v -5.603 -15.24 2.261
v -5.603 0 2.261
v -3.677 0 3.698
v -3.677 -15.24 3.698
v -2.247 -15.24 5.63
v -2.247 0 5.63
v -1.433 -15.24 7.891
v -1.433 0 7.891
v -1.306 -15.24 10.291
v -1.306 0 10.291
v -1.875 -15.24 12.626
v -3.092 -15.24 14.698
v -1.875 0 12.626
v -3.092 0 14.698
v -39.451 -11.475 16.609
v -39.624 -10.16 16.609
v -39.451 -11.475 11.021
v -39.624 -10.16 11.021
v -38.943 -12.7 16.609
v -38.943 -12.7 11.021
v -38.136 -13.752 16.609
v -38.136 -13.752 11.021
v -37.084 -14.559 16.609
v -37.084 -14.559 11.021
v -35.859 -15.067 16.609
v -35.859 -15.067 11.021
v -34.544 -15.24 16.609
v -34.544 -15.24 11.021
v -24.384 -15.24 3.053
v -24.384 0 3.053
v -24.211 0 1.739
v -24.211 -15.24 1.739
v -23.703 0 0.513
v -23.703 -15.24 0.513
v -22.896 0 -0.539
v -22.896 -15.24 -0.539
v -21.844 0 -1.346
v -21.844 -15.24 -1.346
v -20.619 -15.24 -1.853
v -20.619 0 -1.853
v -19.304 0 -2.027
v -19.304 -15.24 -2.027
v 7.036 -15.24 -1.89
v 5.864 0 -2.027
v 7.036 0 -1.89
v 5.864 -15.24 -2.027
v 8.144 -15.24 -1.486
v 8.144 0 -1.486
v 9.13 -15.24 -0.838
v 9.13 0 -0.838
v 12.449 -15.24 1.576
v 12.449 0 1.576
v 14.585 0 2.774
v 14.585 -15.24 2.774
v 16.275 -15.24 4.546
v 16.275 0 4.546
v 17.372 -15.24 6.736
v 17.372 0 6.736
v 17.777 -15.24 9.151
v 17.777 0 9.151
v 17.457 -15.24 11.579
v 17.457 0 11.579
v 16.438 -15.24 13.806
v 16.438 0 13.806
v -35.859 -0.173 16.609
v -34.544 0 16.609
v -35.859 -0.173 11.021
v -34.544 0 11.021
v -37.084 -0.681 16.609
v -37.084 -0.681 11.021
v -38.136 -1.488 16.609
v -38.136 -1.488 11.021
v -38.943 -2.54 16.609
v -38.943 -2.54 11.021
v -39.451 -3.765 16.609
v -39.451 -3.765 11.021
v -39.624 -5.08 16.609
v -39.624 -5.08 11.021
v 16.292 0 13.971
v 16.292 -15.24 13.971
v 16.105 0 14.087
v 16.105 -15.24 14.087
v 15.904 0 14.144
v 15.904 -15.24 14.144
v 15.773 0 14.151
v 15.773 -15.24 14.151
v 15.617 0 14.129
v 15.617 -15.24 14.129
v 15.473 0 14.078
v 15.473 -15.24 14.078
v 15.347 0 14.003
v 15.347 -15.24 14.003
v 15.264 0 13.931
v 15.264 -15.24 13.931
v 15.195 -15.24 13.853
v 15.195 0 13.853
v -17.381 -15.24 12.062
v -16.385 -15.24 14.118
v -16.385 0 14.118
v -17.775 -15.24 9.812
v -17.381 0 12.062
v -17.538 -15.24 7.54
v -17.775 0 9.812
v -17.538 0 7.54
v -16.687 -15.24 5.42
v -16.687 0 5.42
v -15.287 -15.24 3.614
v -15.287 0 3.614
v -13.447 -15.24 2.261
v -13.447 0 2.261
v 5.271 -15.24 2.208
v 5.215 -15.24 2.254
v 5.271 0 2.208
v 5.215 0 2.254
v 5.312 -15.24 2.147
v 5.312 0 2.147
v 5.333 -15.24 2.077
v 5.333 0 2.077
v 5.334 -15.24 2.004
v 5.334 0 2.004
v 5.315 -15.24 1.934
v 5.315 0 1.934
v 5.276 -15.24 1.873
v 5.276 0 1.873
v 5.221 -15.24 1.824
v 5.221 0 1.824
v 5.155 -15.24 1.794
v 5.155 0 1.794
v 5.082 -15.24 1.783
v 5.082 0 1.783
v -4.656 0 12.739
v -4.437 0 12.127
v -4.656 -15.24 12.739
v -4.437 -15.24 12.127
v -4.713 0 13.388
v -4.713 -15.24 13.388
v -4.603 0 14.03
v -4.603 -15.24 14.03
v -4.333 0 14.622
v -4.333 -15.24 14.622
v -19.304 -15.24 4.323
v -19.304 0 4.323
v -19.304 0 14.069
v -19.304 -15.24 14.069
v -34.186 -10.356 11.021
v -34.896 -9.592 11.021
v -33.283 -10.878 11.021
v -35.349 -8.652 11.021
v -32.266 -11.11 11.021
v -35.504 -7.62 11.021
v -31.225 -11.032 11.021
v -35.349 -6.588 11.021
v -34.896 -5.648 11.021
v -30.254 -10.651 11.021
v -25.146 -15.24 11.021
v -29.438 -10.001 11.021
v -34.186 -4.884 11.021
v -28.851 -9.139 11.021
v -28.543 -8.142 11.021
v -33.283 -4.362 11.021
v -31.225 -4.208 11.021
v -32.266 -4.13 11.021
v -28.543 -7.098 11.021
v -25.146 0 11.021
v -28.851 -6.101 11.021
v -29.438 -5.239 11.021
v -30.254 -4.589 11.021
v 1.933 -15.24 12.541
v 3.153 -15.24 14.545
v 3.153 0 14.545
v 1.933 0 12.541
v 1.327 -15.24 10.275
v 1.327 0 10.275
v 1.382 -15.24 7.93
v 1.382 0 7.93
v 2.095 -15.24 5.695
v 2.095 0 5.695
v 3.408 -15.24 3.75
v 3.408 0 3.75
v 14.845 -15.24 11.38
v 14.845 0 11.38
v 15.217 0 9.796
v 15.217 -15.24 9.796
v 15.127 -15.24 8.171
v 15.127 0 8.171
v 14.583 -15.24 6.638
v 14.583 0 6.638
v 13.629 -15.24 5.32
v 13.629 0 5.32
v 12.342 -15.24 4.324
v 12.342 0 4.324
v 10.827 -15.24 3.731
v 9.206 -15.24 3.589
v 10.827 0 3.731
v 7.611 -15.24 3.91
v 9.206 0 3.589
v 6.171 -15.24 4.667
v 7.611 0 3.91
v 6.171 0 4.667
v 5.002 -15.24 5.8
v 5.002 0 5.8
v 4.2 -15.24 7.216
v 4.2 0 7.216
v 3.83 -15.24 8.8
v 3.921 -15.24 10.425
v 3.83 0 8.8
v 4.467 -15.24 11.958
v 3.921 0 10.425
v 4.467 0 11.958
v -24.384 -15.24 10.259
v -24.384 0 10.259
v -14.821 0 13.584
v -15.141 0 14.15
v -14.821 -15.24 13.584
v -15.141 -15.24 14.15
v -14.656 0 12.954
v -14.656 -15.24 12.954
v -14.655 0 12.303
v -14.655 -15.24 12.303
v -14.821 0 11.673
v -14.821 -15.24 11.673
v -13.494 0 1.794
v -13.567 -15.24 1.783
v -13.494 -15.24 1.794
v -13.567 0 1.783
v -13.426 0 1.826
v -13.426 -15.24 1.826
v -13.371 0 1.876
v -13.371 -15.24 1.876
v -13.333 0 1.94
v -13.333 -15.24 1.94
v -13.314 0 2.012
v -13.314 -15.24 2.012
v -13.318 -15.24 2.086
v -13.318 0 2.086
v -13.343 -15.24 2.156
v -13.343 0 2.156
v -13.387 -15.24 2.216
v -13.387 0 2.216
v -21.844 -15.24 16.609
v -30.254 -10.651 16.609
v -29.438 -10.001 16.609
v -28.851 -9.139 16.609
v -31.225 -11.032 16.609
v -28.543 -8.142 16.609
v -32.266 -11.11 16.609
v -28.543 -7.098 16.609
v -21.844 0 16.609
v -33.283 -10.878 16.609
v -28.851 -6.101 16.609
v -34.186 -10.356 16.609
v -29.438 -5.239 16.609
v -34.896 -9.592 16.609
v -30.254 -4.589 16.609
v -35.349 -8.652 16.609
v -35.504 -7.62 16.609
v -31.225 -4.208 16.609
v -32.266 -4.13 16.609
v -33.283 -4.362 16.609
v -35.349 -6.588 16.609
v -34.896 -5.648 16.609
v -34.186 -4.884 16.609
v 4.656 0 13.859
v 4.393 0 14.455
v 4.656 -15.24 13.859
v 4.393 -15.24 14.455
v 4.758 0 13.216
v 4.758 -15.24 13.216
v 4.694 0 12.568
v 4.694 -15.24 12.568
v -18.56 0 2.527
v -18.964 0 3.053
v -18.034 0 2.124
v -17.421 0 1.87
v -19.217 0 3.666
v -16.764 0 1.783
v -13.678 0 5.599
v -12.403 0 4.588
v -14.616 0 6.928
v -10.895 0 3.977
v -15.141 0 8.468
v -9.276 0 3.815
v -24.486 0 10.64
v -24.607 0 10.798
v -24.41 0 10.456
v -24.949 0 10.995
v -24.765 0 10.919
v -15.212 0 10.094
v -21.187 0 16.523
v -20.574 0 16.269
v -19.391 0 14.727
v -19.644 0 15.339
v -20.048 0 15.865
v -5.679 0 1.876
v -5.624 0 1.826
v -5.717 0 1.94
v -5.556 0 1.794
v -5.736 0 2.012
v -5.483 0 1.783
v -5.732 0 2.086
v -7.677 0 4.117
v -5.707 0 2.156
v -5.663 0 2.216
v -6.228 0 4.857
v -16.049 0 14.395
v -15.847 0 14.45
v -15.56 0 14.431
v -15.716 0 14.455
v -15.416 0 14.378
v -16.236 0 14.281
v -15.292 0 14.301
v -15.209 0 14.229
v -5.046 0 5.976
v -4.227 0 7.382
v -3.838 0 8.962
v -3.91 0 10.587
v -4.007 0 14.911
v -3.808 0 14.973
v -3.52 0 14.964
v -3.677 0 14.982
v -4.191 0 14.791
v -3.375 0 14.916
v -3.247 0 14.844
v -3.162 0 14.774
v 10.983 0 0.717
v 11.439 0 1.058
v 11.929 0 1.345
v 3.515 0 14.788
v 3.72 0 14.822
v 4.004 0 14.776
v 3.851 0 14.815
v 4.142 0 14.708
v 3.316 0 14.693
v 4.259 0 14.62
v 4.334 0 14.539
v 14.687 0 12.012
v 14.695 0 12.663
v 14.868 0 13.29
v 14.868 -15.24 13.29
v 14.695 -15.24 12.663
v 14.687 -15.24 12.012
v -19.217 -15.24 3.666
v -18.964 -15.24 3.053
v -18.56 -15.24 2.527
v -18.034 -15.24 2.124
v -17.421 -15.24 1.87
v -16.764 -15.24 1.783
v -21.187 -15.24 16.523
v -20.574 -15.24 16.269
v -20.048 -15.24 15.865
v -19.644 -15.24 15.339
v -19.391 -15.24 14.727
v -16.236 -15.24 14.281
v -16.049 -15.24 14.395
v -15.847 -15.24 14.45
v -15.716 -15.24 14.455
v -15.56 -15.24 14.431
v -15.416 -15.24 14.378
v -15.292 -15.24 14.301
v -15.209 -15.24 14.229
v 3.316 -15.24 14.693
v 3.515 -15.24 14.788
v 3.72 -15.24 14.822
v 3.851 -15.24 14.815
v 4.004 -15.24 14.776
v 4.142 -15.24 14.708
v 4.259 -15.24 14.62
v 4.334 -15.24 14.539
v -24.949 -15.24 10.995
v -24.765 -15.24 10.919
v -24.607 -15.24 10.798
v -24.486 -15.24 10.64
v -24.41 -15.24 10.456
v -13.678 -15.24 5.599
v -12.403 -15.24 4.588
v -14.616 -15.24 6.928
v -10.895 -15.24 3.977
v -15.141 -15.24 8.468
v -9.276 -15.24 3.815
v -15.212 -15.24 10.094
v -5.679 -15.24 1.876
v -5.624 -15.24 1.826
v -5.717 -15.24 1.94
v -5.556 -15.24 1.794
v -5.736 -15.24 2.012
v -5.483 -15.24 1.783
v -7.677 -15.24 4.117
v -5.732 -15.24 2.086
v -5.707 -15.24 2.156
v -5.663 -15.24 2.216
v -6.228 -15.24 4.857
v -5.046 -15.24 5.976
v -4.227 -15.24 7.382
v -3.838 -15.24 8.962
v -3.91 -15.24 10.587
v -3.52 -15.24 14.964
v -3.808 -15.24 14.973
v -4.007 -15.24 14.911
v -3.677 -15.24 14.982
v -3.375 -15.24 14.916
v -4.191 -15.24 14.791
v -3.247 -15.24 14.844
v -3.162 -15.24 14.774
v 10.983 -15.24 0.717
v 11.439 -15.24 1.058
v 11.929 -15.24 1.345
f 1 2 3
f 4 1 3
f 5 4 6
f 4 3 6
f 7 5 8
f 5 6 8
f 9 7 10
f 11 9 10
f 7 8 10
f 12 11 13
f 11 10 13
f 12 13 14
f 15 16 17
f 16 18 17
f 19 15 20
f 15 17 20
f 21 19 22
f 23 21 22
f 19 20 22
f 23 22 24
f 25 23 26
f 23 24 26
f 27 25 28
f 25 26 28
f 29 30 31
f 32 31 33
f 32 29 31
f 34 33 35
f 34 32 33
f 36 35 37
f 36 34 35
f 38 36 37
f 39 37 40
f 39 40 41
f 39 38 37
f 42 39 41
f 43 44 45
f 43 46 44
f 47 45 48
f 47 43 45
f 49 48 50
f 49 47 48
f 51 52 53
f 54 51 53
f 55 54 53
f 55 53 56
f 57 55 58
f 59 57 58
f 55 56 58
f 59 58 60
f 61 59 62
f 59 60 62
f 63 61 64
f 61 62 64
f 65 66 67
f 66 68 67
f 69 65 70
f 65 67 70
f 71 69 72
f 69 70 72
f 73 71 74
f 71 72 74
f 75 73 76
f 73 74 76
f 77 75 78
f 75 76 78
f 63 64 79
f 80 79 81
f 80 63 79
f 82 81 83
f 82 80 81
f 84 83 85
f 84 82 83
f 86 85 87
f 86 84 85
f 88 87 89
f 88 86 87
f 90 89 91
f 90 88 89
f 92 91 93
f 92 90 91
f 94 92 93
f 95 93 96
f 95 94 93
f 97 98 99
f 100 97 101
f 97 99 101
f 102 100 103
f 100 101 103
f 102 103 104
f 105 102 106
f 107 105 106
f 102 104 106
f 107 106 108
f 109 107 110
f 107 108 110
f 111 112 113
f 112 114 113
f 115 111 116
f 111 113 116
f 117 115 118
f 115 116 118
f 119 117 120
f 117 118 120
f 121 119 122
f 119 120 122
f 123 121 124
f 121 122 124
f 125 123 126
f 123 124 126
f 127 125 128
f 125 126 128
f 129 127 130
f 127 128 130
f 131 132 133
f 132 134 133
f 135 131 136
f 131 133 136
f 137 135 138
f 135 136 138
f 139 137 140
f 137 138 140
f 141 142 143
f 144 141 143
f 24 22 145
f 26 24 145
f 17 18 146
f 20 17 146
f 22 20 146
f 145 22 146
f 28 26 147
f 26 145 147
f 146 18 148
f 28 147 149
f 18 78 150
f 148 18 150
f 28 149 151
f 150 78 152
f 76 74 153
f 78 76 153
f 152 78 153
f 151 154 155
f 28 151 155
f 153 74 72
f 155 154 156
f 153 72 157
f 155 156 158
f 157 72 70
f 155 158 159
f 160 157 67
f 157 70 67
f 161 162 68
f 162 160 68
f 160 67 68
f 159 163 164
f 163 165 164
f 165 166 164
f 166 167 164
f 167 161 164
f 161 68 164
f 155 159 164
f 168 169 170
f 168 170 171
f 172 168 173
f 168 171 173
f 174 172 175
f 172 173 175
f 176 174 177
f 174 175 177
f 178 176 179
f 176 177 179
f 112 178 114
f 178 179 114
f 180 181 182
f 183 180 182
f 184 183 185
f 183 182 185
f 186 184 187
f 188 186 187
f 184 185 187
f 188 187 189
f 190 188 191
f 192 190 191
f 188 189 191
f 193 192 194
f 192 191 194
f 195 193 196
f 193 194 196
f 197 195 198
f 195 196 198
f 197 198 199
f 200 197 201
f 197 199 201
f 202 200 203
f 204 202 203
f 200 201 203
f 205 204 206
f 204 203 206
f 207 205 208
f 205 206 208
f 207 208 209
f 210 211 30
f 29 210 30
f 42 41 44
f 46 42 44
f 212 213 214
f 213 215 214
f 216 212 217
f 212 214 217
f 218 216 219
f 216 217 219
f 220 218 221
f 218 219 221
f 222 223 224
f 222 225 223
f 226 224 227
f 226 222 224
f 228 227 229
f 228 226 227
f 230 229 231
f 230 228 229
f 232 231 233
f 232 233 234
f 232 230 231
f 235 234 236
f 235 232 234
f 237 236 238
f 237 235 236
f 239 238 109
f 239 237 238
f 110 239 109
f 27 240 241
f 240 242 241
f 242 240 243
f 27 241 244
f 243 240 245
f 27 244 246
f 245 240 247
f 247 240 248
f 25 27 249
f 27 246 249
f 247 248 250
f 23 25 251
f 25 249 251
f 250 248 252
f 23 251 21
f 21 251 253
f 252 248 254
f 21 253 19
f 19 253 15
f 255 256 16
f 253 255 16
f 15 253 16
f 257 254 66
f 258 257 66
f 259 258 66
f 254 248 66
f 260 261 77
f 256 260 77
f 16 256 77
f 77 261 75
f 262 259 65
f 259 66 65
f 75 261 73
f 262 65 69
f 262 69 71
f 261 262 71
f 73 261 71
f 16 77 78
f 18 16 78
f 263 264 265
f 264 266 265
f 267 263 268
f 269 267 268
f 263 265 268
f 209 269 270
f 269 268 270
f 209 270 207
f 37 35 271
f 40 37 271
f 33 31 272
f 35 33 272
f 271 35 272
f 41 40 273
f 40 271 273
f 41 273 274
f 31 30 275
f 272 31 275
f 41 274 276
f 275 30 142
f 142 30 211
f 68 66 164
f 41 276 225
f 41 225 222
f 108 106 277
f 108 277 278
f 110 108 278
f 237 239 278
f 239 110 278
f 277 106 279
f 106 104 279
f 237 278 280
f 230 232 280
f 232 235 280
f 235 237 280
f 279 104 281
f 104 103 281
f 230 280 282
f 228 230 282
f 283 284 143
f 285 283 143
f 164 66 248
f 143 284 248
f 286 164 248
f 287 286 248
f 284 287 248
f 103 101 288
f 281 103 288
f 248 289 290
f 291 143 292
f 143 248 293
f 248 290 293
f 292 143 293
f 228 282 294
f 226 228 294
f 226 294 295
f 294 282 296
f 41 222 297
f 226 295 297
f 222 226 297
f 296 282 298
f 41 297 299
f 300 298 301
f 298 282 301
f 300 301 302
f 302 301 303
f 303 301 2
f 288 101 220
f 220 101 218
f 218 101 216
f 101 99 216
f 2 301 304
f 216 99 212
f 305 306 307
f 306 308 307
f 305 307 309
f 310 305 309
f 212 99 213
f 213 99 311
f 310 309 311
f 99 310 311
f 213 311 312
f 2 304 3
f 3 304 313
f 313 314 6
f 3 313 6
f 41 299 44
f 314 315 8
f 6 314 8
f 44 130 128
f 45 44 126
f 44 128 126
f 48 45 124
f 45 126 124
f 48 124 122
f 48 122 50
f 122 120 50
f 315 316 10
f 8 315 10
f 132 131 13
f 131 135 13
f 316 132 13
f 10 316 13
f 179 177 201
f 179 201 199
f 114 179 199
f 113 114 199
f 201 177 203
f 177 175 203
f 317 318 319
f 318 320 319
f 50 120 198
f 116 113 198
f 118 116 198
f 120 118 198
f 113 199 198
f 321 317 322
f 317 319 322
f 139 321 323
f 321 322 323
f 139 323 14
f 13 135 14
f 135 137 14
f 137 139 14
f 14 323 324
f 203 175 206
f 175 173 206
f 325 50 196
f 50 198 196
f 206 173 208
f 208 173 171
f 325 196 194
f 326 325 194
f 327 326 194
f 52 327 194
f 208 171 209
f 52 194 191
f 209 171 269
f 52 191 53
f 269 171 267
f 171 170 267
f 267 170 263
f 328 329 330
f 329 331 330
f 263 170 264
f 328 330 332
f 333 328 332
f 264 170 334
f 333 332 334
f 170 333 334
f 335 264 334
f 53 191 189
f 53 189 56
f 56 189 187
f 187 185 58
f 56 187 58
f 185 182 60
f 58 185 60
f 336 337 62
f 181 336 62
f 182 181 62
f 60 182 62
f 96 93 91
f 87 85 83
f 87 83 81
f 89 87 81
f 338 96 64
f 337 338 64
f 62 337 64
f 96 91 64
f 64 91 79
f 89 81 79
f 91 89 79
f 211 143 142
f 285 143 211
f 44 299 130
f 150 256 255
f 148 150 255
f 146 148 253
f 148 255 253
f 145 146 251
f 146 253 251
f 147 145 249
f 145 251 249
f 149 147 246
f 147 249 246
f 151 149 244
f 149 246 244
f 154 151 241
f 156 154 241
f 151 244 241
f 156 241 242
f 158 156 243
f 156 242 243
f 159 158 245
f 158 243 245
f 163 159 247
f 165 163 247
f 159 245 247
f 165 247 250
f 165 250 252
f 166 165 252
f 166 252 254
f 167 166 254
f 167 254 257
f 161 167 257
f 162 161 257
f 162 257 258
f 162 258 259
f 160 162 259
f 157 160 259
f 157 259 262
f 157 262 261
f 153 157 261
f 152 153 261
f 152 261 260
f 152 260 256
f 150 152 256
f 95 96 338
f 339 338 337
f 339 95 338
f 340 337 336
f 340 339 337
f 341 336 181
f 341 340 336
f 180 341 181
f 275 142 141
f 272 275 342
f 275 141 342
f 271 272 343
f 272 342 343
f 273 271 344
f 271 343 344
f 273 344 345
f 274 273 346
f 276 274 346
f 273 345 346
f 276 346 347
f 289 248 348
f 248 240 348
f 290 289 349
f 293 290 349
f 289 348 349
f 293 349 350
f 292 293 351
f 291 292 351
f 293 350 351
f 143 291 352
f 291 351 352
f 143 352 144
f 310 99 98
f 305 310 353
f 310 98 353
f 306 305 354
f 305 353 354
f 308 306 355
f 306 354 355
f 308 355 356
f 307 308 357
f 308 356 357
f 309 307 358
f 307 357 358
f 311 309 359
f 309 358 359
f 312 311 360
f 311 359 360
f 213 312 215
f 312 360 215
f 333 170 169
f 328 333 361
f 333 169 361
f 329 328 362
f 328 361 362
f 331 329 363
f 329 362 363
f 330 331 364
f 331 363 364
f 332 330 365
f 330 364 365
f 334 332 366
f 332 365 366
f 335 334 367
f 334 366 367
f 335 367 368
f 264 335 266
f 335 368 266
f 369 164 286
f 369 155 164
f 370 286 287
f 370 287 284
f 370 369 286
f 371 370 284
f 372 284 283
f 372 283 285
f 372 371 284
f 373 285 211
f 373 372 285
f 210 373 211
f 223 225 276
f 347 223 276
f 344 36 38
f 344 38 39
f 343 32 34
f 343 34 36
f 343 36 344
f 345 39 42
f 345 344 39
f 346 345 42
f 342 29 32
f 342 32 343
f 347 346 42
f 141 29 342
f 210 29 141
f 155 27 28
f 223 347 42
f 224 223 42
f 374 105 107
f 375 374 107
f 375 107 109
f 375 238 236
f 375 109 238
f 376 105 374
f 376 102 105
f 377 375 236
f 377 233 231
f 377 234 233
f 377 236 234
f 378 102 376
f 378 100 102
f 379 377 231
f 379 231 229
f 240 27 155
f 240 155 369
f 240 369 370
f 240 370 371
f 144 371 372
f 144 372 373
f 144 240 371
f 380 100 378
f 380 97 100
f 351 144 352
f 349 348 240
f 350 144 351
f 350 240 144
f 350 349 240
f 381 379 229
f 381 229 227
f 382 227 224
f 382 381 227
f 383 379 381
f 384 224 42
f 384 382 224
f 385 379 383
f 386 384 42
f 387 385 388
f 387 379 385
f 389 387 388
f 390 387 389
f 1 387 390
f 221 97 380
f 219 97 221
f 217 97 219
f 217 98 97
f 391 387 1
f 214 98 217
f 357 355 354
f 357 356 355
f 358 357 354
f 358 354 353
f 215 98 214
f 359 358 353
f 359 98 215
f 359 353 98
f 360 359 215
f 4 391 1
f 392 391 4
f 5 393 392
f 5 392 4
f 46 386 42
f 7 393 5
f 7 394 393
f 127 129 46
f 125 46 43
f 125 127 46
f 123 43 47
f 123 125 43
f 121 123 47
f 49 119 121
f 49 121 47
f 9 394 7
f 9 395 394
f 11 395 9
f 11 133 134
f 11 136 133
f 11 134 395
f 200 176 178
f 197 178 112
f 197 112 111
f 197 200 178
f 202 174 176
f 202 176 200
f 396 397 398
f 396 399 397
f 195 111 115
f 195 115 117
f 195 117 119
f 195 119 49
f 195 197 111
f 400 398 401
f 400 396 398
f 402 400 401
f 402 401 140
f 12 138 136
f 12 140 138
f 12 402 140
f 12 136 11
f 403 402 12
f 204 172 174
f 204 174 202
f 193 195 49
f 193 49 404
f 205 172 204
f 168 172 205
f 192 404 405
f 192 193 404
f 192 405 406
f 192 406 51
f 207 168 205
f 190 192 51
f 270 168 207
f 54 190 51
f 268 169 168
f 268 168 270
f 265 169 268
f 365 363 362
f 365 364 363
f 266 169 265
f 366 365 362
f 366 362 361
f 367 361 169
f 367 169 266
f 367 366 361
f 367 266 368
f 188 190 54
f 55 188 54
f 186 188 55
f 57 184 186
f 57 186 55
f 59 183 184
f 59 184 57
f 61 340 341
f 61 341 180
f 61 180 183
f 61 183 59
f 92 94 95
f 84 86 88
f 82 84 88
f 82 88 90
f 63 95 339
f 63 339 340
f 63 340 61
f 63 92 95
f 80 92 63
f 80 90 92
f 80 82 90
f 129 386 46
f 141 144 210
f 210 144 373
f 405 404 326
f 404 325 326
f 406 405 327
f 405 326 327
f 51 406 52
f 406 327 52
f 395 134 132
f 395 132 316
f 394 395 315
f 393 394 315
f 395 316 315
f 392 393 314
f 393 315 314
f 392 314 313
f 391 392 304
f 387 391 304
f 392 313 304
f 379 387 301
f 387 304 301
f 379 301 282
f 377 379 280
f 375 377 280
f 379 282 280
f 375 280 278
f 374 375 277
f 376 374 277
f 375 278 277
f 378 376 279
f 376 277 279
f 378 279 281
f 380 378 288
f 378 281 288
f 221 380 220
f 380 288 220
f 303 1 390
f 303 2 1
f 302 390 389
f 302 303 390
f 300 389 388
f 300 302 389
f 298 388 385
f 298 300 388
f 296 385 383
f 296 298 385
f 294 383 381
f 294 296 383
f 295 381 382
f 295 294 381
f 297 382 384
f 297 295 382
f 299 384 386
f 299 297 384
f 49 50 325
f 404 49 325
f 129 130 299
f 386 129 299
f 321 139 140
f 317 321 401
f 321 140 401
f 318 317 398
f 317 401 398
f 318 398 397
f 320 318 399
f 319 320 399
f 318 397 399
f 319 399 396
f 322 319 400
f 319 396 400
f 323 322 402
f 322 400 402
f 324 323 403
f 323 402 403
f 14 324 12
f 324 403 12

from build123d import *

# Parameters (mm, degrees)
F1_DEPTH = 15.24
F3_DEPTH = 15.24
F5_D     = 7
F6_R     = 5.08
F7_R     = 2.54
F8_R     = 0.762
F9_R     = 0.254


with BuildPart() as f1:
    # F0 (on Front) → F1 (new body)
    with BuildSketch(Plane.XZ):
        with BuildLine():
            ThreePointArc((-5.4838847455, 13.5661152545), (-9.2757152012, 3.8154394137), (-13.9029439924, 13.1985311894))
            Line((-13.9029439924, 13.1985311894), (-15.8486968779, 14.831211718))
            ThreePointArc((-15.8486968779, 14.831211718), (-9.1649219573, 1.2778569308), (-3.6878335213, 15.3621664787))
            Line((-3.6878335213, 15.3621664787), (-5.4838847455, 13.5661152545))
        make_face()
    extrude(amount=F1_DEPTH)



with BuildPart() as f1b:
    # F0 (on Front) → F1, piece 2 (new body)
    with BuildSketch(Plane.XZ):
        with BuildLine():
            ThreePointArc((13.9452403049, 12.9163381462), (9.2059751792, 3.5893330735), (5.531186829, 13.3847191373))
            Line((5.531186829, 13.3847191373), (3.7567731907, 15.2021503575))
            ThreePointArc((3.7567731907, 15.2021503575), (9.0648008077, 1.0532593765), (15.9104059892, 14.525600037))
            Line((15.9104059892, 14.525600037), (13.9452403049, 12.9163381462))
        make_face()
    extrude(amount=F1_DEPTH)


with BuildPart() as f1_1:
    add(f1.part)

    add(f1b.part)  # F3 merges F1b
    # F2 (on Front) → F3 (join)
    with BuildSketch(Plane.XZ):
        Polygon((12.2539751792, 1.7834394137), (-19.304, 1.7834394137), (-19.304, 16.609211718), (-39.624, 16.609211718), (-39.624, 11.021211718), (-24.384, 11.021211718), (-24.384, -2.0265605863), (7.7133939915, -2.0265605863), align=None)
    extrude(amount=F3_DEPTH)

    # F5 (through all)
    with Locations(Plane(origin=(0, 0, 11.021211718), x_dir=(1, 0, 0), z_dir=(0, 0, -1))):
        with Locations((-32.004, 7.62)):
            Hole(F5_D / 2)

    # F6
    f6_edges = [f1_1.edges().sort_by_distance(p)[0] for p in [
        (-39.624, -15.24, 13.815212),
        (-39.624, 0, 13.815212),
        (-24.384, -7.62, -2.026561),
        (11.72475, -7.62, 1.339367),
        (7.713394, -7.62, -2.026561),
    ]]
    fillet(f6_edges, radius=F6_R)

    # F7
    f7_edges = [f1_1.edges().sort_by_distance(p)[0] for p in [
        (-19.304, -7.62, 16.609212),
        (-19.304, -7.62, 1.783439),
        (-13.902944, -7.62, 13.198531),
        (-5.483885, -7.62, 13.566115),
        (5.531187, -7.62, 13.384719),
        (13.94524, -7.62, 12.916338),
    ]]
    fillet(f7_edges, radius=F7_R)

    # F8
    f8_edges = [f1_1.edges().sort_by_distance(p)[0] for p in [
        (-15.848697, -7.62, 14.831212),
        (-3.687834, -7.62, 15.362166),
        (3.756773, -7.62, 15.20215),
        (15.910406, -7.62, 14.5256),
        (-24.384, -7.62, 11.021212),
    ]]
    fillet(f8_edges, radius=F8_R)

    # F9
    f9_edges = [f1_1.edges().sort_by_distance(p)[0] for p in [
        (-6.659121, -7.62, 1.783439),
        (-12.390879, -7.62, 1.783439),
        (6.101047, -7.62, 1.783439),
    ]]
    fillet(f9_edges, radius=F9_R)


solid = f1_1.part
